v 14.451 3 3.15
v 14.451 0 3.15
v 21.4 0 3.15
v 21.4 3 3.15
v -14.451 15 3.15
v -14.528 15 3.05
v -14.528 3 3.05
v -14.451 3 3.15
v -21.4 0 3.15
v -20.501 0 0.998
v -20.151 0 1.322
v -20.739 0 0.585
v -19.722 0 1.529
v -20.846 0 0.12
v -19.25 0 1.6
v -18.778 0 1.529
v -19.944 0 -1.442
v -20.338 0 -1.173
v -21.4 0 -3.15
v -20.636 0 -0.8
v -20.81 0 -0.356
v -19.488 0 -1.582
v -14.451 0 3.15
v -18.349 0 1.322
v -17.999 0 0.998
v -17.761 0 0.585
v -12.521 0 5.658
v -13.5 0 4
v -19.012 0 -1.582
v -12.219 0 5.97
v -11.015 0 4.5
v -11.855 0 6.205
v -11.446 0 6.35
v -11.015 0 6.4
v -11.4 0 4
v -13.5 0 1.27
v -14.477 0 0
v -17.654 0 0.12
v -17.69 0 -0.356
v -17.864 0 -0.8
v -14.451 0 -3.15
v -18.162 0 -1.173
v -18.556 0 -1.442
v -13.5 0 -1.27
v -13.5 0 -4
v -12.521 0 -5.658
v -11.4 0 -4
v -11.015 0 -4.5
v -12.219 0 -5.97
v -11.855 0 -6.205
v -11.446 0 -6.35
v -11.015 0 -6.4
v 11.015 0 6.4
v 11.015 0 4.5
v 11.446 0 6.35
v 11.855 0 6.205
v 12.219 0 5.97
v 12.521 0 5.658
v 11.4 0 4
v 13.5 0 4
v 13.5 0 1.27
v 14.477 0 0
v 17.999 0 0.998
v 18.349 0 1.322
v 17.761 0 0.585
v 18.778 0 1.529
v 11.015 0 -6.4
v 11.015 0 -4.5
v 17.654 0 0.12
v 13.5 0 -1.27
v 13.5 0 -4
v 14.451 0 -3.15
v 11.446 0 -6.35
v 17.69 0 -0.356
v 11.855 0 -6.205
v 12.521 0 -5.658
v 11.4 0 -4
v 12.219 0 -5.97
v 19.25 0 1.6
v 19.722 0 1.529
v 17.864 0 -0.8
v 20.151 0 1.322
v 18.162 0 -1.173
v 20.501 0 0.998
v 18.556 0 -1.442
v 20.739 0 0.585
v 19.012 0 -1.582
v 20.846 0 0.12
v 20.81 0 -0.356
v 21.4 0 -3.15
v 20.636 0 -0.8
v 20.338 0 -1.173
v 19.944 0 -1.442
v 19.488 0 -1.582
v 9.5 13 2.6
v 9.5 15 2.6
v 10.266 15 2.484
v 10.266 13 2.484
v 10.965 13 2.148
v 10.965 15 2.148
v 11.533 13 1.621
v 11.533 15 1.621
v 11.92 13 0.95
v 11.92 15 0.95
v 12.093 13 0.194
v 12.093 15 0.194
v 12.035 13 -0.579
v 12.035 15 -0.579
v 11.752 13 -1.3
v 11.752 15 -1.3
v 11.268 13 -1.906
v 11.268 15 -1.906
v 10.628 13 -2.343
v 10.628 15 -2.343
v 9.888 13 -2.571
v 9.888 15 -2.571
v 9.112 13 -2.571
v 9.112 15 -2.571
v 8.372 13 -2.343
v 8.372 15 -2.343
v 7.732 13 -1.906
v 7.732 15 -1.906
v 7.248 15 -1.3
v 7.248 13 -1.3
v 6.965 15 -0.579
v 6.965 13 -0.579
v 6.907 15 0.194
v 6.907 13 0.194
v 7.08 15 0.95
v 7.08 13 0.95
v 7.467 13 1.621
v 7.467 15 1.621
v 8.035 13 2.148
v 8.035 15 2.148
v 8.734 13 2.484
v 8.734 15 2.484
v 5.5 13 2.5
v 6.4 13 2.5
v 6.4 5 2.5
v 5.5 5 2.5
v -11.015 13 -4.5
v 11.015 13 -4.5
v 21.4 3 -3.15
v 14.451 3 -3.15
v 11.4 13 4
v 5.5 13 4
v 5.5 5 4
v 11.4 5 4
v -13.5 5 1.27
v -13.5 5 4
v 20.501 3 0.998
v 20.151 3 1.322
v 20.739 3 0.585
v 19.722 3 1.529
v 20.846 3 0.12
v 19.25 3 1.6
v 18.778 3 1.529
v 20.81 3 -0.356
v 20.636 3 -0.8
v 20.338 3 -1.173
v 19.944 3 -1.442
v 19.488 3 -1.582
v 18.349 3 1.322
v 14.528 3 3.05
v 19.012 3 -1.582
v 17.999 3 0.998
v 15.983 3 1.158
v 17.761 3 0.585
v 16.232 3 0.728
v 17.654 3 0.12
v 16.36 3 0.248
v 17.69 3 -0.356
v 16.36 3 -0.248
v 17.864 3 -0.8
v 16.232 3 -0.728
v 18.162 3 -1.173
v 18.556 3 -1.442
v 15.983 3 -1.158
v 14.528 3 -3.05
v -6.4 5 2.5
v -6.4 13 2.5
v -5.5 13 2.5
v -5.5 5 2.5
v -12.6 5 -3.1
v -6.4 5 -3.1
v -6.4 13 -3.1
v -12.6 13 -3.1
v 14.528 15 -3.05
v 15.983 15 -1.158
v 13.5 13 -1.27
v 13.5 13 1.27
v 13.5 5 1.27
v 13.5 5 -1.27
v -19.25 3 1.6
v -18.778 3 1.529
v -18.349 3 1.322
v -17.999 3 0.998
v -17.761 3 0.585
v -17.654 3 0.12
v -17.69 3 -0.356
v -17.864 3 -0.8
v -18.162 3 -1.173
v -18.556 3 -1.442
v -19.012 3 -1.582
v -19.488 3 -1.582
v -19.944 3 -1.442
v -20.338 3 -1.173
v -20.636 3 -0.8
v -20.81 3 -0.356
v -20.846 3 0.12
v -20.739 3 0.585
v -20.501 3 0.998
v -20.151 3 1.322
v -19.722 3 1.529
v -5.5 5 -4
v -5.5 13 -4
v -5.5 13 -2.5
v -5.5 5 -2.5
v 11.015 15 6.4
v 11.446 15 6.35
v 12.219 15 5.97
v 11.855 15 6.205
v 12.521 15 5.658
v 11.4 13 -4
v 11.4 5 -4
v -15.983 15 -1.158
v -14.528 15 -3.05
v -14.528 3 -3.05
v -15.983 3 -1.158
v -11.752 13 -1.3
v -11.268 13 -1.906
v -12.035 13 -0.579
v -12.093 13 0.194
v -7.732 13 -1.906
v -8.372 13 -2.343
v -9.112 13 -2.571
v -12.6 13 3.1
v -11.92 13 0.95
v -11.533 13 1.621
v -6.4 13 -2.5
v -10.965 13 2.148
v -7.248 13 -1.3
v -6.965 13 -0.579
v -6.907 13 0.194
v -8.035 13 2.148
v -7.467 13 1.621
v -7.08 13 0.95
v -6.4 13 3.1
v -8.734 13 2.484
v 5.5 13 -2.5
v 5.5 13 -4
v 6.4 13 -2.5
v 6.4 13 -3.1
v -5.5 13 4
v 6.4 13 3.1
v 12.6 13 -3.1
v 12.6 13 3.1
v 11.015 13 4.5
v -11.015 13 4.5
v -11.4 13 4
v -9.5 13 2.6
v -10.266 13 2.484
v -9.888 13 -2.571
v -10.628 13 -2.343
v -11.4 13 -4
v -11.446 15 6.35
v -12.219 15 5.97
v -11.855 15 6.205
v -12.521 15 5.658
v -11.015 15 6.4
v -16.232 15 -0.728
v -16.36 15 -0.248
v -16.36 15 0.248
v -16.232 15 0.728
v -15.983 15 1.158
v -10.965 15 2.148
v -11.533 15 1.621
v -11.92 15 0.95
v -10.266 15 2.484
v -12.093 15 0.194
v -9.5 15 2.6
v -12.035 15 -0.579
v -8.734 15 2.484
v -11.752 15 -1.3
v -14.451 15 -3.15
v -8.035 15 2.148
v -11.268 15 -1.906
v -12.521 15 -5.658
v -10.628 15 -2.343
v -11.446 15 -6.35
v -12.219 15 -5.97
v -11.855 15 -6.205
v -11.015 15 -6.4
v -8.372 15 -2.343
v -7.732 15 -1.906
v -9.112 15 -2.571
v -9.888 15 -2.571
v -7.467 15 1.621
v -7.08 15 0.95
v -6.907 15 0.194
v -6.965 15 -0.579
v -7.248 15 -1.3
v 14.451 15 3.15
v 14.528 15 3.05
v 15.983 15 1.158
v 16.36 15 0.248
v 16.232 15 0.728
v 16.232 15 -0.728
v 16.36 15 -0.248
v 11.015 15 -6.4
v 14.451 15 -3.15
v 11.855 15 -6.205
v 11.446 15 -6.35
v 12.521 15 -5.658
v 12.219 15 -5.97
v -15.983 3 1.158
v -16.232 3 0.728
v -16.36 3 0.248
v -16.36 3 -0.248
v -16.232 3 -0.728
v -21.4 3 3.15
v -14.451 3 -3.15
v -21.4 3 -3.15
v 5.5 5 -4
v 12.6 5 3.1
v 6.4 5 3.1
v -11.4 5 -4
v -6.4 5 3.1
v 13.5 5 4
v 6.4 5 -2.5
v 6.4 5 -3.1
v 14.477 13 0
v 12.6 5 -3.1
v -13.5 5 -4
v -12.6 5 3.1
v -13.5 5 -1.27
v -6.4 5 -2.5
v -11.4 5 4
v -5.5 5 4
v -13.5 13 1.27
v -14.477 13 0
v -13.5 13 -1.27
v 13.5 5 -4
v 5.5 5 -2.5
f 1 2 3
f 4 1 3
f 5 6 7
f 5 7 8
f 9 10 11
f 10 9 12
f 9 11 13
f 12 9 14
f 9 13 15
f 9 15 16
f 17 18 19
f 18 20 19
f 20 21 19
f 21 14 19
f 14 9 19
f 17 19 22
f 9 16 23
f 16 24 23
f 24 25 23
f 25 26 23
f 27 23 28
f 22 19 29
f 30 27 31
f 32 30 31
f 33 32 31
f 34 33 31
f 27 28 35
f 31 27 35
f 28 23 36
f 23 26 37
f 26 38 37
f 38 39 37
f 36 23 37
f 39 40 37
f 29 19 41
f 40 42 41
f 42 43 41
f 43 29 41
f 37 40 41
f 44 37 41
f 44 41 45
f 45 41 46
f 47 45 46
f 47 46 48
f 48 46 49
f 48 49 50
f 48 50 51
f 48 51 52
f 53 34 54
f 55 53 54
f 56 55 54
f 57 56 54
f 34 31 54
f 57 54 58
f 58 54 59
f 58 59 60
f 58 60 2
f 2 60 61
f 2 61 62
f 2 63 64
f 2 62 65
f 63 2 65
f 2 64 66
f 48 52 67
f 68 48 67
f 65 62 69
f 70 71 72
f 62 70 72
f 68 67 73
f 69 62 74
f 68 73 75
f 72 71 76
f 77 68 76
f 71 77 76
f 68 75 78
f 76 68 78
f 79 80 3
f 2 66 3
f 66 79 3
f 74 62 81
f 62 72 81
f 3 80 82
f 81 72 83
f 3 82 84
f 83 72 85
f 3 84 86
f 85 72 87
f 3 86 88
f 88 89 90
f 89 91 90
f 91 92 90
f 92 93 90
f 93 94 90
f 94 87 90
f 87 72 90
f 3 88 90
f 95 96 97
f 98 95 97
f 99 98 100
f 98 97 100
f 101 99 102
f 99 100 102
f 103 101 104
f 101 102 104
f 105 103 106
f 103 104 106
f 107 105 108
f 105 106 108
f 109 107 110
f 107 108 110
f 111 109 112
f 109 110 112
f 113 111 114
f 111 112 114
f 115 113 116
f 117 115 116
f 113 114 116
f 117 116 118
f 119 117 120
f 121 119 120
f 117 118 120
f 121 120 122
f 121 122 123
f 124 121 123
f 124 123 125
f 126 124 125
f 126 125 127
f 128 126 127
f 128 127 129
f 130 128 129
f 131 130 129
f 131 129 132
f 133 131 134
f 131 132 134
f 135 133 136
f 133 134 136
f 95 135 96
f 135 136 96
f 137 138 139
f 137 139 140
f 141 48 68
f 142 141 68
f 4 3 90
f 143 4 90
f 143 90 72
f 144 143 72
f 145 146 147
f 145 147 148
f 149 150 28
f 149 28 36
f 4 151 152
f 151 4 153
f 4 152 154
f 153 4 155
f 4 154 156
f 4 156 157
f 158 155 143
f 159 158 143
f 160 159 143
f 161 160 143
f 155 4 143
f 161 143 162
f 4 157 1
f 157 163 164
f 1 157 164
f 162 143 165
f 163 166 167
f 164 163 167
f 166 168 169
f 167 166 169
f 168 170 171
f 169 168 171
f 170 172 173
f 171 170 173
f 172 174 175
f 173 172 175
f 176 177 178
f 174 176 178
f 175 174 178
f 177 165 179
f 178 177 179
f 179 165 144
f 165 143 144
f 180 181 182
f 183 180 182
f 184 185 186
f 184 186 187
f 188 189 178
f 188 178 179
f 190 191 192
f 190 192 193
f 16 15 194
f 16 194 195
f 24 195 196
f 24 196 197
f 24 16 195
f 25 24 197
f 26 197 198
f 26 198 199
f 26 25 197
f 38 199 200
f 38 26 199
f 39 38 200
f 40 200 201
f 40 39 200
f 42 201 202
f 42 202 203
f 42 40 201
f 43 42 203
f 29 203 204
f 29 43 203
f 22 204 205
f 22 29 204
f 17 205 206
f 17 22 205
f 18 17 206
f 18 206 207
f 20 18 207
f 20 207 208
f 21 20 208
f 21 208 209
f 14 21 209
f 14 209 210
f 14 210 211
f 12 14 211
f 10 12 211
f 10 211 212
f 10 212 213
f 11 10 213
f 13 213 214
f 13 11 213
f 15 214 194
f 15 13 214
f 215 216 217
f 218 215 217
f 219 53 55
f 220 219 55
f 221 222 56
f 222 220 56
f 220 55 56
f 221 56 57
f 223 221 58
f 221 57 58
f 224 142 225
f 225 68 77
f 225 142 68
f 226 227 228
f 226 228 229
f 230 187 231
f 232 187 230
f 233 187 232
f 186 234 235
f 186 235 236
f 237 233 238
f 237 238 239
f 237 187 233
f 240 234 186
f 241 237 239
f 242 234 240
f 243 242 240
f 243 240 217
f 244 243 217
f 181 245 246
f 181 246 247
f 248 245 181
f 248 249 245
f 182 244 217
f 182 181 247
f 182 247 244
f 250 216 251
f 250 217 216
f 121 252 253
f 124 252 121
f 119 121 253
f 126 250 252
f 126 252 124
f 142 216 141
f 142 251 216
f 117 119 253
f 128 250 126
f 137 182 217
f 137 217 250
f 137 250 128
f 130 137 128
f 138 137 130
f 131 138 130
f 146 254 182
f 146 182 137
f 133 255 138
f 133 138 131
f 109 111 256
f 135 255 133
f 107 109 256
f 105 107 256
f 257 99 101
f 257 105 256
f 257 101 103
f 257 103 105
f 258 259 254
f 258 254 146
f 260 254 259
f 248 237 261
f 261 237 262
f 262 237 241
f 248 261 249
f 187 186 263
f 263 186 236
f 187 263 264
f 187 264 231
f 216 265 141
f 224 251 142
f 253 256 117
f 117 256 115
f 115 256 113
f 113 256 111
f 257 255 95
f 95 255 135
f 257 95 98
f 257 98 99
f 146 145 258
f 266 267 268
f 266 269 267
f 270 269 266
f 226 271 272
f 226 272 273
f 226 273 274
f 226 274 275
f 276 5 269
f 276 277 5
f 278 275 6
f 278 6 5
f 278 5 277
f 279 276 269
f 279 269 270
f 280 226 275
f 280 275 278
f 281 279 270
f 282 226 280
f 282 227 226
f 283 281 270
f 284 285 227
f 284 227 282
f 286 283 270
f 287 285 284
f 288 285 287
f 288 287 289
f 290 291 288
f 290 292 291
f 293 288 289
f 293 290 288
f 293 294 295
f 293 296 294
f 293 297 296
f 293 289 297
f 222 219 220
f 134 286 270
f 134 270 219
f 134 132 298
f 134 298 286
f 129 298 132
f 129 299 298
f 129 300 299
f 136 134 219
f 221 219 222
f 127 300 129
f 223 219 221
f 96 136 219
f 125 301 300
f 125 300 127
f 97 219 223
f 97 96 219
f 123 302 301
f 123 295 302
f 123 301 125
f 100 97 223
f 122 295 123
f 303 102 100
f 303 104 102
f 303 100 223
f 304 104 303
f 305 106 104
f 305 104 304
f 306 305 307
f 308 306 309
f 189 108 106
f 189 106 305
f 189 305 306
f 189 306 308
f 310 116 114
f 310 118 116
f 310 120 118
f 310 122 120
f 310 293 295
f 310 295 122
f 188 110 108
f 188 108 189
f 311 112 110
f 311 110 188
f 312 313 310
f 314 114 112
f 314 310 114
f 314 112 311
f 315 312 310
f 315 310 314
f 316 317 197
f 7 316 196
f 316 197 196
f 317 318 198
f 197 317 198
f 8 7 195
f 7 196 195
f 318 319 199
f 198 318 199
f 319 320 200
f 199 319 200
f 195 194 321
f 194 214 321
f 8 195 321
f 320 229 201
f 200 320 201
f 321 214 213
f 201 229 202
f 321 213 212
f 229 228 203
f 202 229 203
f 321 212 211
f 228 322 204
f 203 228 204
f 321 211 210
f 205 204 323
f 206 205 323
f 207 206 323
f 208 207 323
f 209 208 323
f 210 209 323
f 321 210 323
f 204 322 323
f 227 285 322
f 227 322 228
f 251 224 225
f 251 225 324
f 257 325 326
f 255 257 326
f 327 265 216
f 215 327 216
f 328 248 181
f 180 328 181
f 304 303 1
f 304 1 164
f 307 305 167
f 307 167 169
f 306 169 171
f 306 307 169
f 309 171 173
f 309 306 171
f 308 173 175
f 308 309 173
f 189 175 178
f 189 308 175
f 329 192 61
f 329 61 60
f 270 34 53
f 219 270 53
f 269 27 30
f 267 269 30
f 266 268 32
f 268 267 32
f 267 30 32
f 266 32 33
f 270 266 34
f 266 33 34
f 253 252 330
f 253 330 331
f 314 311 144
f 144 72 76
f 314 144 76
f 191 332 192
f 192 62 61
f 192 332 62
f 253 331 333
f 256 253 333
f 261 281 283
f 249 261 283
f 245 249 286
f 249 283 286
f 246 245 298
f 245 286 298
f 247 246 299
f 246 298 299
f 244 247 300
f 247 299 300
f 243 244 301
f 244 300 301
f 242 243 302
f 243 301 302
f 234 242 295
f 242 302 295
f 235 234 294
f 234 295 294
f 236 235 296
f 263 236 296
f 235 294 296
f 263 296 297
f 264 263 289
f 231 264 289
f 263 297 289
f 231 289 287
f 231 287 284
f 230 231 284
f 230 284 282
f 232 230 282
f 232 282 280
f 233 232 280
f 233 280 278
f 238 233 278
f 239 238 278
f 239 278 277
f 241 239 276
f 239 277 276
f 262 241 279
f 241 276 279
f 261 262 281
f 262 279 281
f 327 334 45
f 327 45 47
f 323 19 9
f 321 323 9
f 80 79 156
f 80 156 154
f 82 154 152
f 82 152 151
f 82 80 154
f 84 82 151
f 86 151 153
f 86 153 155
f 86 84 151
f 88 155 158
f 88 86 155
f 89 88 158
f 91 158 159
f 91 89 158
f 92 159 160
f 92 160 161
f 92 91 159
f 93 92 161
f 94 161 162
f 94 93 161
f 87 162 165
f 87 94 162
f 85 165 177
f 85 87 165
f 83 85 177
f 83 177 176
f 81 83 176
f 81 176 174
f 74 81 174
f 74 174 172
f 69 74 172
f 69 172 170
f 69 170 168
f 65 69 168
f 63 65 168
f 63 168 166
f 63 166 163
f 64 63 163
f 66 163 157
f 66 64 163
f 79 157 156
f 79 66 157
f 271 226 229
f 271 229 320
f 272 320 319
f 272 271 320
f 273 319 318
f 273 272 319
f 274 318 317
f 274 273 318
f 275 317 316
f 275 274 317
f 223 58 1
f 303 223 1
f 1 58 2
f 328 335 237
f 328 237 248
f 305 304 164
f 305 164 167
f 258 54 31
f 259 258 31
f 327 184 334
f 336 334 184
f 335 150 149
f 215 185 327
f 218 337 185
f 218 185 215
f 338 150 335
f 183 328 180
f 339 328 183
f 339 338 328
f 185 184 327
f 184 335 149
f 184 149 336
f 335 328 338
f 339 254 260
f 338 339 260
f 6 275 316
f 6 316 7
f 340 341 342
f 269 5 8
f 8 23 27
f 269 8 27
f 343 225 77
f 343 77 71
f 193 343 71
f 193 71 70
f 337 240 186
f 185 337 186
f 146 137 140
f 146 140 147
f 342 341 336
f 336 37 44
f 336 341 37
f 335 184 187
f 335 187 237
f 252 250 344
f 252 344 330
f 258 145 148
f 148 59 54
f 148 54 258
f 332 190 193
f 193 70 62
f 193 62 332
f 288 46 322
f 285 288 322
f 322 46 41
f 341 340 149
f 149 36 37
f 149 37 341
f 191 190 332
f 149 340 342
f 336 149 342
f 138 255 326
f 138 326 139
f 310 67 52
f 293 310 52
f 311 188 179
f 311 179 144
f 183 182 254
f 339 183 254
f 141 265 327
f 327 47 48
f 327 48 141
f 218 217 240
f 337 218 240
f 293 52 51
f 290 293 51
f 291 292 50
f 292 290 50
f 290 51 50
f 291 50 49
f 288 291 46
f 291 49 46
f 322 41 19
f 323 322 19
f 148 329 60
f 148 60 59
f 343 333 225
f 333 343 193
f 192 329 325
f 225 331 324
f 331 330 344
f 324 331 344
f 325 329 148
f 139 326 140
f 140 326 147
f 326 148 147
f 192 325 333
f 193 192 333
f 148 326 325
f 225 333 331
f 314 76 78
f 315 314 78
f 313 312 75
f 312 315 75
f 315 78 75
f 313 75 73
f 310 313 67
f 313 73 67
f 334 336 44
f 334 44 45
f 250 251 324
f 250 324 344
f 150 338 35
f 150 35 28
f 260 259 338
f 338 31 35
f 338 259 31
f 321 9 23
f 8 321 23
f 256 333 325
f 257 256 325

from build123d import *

# Parameters (mm, degrees)
SKETCH1_W           = 24
SKETCH1_H           = 13
BOSS_EXTRUDE1_DEPTH = 15
CUT_EXTRUDE1_DEPTH  = 13
SKETCH3_R           = 2.6
CUT_EXTRUDE2_DEPTH  = 2
CUT_EXTRUDE3_DEPTH  = 13
BOSS_EXTRUDE3_DEPTH = 8
SKETCH6_R           = 1.6
BOSS_EXTRUDE4_DEPTH = 3
FILLET1_R           = 2
CUT_EXTRUDE8_DEPTH  = 28.009257672
CUT_EXTRUDE9_DEPTH  = 12


with BuildPart() as part:
    # Sketch1 → Boss-Extrude1 (new body)
    with BuildSketch(Plane(origin=(0, 0, 0), x_dir=(1, 0, 0), z_dir=(0, 1, 0))):
        Polygon((-12, -6.5), (-12, 6.5), (-17, 0), align=None)
        Rectangle(SKETCH1_W, SKETCH1_H)
        Polygon((17, 0), (12, -6.5), (12, 6.5), align=None)
    extrude(amount=BOSS_EXTRUDE1_DEPTH)

    # Sketch2 → Cut-Extrude1 (cut)
    with BuildSketch(Plane.XZ):
        Polygon((-11.015197005, 4.5), (-14.476735467, 0), (-11.015197005, -4.5), (0, -4.5), (0, 4.5), align=None)
        Polygon((0, 4.5), (0, -4.5), (11.015197005, -4.5), (14.476735467, 0), (11.015197005, 4.5), align=None)
    extrude(amount=-CUT_EXTRUDE1_DEPTH, mode=Mode.SUBTRACT)

    # Sketch3 → Cut-Extrude2 (cut)
    with BuildSketch(Plane(origin=(0, 15, 0), x_dir=(1, 0, 0), z_dir=(0, 1, 0))):
        with Locations(Location((-9.5, 0, 0), (0, 0, 270))):
            Circle(SKETCH3_R)
        with Locations(Location((9.5, 0, 0), (0, 0, 270))):
            Circle(SKETCH3_R)
    extrude(amount=-CUT_EXTRUDE2_DEPTH, mode=Mode.SUBTRACT)

    # Sketch4 → Cut-Extrude3 (cut)
    with BuildSketch(Plane.XZ.offset(-13)):
        Polygon((-6.4, 2.5), (-5.5, 2.5), (-5.5, 4), (-13.5, 4), (-13.5, -4), (-5.5, -4), (-5.5, -2.5), (-6.4, -2.5), (-6.4, -3.1), (-12.092120082, -3.1), (-12.6, -2.439756107), (-12.6, 2.439756107), (-12.082269007, 3.1), (-6.4, 3.1), align=None)
        Polygon((6.4, 2.5), (6.4, 3.1), (12.082269007, 3.1), (12.6, 2.439756107), (12.6, -2.439756107), (12.092120082, -3.1), (6.4, -3.1), (6.4, -2.5), (5.5, -2.5), (5.5, -4), (13.5, -4), (13.5, 4), (5.5, 4), (5.5, 2.5), align=None)
    extrude(amount=CUT_EXTRUDE3_DEPTH, mode=Mode.SUBTRACT)

    # Sketch5 → Boss-Extrude3 (add)
    with BuildSketch(Plane.XZ.offset(-13)):
        Polygon((-6.4, -3.1), (-12.6, -3.1), (-12.6, 3.1), (-6.4, 3.1), (-6.4, 2.5), (-5.5, 2.5), (-5.5, 4), (-13.5, 4), (-13.5, -4), (-5.5, -4), (-5.5, -2.5), (-6.4, -2.5), align=None)
        Polygon((12.6, -3.1), (12.6, 3.1), (6.4, 3.1), (6.4, 2.5), (5.5, 2.5), (5.5, 4), (13.5, 4), (13.5, -4), (5.5, -4), (5.5, -2.5), (6.4, -2.5), (6.4, -3.1), align=None)
    extrude(amount=BOSS_EXTRUDE3_DEPTH)

    # Sketch6 → Boss-Extrude4 (add)
    # profile 1 of 2: a face of its own
    with BuildSketch(Plane(origin=(0, 0, 0), x_dir=(1, 0, 0), z_dir=(0, 1, 0))):
        Polygon((21.5, 3.25), (14.5, 3.25), (17, 0), (14.5, -3.25), (21.5, -3.25), align=None)
        with Locations(Location((19.25, 0, 0), (0, 0, 270))):
            Circle(SKETCH6_R, mode=Mode.SUBTRACT)
    # profile 2 of 2: a face of its own
    with BuildSketch(Plane(origin=(0, 0, 0), x_dir=(1, 0, 0), z_dir=(0, 1, 0))):
        Polygon((-17, 0), (-14.5, 3.25), (-21.5, 3.25), (-21.5, -3.25), (-14.5, -3.25), align=None)
        with Locations(Location((-19.25, 0, 0), (0, 0, 270))):
            Circle(SKETCH6_R, mode=Mode.SUBTRACT)
    extrude(amount=BOSS_EXTRUDE4_DEPTH)

    # Fillet1
    fillet1_edges = [part.edges().sort_by_distance(p)[0] for p in [
        (-17, 9, 0),
        (-12, 7.5, -6.5),
        (12, 7.5, -6.5),
        (17, 9, 0),
        (12, 7.5, 6.5),
        (-12, 7.5, 6.5),
    ]]
    fillet(fillet1_edges, radius=FILLET1_R)

    # Sketch8 → Cut-Extrude8 (cut, through all)
    with BuildSketch(Plane.XZ):
        with BuildLine():
            Line((-14.5, -3.25), (-21.5, -3.25))
            Line((-21.5, -3.25), (-21.5, 3.25))
            Line((-21.5, 3.25), (-14.5, 3.25))
            Line((-14.5, 3.25), (-12.600444983, 5.719421522))
            ThreePointArc((-12.600444983, 5.719421522), (-11.89870053, 6.294274651), (-11.015197005, 6.5))
            Line((-11.015197005, 6.5), (11.015197005, 6.5))
            ThreePointArc((11.015197005, 6.5), (11.89870053, 6.294274651), (12.600444983, 5.719421522))
            Line((12.600444983, 5.719421522), (14.5, 3.25))
            Line((14.5, 3.25), (21.5, 3.25))
            Line((21.5, 3.25), (21.5, -3.25))
            Line((21.5, -3.25), (14.5, -3.25))
            Line((14.5, -3.25), (12.600444983, -5.719421522))
            ThreePointArc((12.600444983, -5.719421522), (11.89870053, -6.294274651), (11.015197005, -6.5))
            Line((11.015197005, -6.5), (-11.015197005, -6.5))
            ThreePointArc((-11.015197005, -6.5), (-11.89870053, -6.294274651), (-12.600444983, -5.719421522))
            Line((-12.600444983, -5.719421522), (-14.5, -3.25))
        make_face()
        with BuildLine():
            Line((-14.45075985, -3.15), (-21.4, -3.15))
            Line((-21.4, -3.15), (-21.4, 3.15))
            Line((-21.4, 3.15), (-14.45075985, 3.15))
            Line((-14.45075985, 3.15), (-12.521182584, 5.658450446))
            ThreePointArc((-12.521182584, 5.658450446), (-11.854525354, 6.204560918), (-11.015197005, 6.4))
            Line((-11.015197005, 6.4), (11.015197005, 6.4))
            ThreePointArc((11.015197005, 6.4), (11.854525354, 6.204560918), (12.521182584, 5.658450446))
            Line((12.521182584, 5.658450446), (14.45075985, 3.15))
            Line((14.45075985, 3.15), (21.4, 3.15))
            Line((21.4, 3.15), (21.4, -3.15))
            Line((21.4, -3.15), (14.45075985, -3.15))
            Line((14.45075985, -3.15), (12.521182584, -5.658450446))
            ThreePointArc((12.521182584, -5.658450446), (11.854525354, -6.204560918), (11.015197005, -6.4))
            Line((11.015197005, -6.4), (-11.015197005, -6.4))
            ThreePointArc((-11.015197005, -6.4), (-11.854525354, -6.204560918), (-12.521182584, -5.658450446))
            Line((-12.521182584, -5.658450446), (-14.45075985, -3.15))
        make_face(mode=Mode.SUBTRACT)
    extrude(amount=-CUT_EXTRUDE8_DEPTH, mode=Mode.SUBTRACT)

    # Sketch9 → Cut-Extrude9 (cut)
    with BuildSketch(Plane(origin=(0, 15, 0), x_dir=(1, 0, 0), z_dir=(0, 1, 0))):
        with BuildLine():
            Line((14.576923077, -3.15), (14.45075985, -3.15))
            Line((14.45075985, -3.15), (14.527682927, -3.05))
            Line((14.527682927, -3.05), (15.982721046, -1.158450446))
            ThreePointArc((15.982721046, -1.158450446), (16.376735467, 0), (15.982721046, 1.158450446))
            Line((15.982721046, 1.158450446), (14.527682927, 3.05))
            Line((14.527682927, 3.05), (14.45075985, 3.15))
            Line((14.45075985, 3.15), (14.576923077, 3.15))
            Line((14.576923077, 3.15), (16.061983445, 1.219421522))
            ThreePointArc((16.061983445, 1.219421522), (16.476735467, 0), (16.061983445, -1.219421522))
            Line((16.061983445, -1.219421522), (14.576923077, -3.15))
        make_face()
        with BuildLine():
            Line((-14.45075985, -3.15), (-14.576923077, -3.15))
            Line((-14.576923077, -3.15), (-16.061983445, -1.219421522))
            ThreePointArc((-16.061983445, -1.219421522), (-16.476735467, 0), (-16.061983445, 1.219421522))
            Line((-16.061983445, 1.219421522), (-14.576923077, 3.15))
            Line((-14.576923077, 3.15), (-14.45075985, 3.15))
            Line((-14.45075985, 3.15), (-14.527682927, 3.05))
            Line((-14.527682927, 3.05), (-15.982721046, 1.158450446))
            ThreePointArc((-15.982721046, 1.158450446), (-16.376735467, 0), (-15.982721046, -1.158450446))
            Line((-15.982721046, -1.158450446), (-14.527682927, -3.05))
            Line((-14.527682927, -3.05), (-14.45075985, -3.15))
        make_face()
    extrude(amount=-CUT_EXTRUDE9_DEPTH, mode=Mode.SUBTRACT)


solid = part.part
